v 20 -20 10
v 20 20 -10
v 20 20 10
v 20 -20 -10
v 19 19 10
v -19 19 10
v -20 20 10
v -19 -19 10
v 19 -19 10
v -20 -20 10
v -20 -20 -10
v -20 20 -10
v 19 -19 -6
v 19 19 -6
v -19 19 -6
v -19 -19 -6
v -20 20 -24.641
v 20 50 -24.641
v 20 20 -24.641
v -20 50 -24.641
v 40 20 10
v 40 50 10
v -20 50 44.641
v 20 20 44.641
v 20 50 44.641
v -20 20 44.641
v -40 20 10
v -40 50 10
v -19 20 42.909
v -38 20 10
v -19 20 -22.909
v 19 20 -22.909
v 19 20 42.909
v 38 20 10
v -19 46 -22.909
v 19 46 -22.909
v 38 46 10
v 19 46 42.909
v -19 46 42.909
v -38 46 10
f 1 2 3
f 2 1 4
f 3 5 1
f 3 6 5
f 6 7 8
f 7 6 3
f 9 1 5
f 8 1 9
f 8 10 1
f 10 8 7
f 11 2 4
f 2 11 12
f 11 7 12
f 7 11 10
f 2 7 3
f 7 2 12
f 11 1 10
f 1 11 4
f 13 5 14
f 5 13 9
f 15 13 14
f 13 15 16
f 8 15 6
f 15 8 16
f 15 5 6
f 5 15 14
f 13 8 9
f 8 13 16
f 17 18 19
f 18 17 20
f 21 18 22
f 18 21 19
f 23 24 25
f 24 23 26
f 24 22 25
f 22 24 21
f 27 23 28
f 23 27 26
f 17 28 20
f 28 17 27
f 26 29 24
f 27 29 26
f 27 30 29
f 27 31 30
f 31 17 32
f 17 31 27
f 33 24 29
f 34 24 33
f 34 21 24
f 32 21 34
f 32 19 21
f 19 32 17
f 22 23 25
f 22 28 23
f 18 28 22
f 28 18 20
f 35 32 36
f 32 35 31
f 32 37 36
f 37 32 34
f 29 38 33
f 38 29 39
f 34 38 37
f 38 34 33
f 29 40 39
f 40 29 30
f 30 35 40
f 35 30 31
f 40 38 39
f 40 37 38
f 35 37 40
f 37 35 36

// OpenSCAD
difference() {
cube([40,40,20], center=true);
translate([0,0,4]) cube([38,38,20], center=true);
}

translate([0,50,10]) rotate([90,0,0])
difference() {
cylinder(r=40, h=30, $fn=6);
translate([0,0,4]) cylinder(r=38, h=28, $fn=6);
}
